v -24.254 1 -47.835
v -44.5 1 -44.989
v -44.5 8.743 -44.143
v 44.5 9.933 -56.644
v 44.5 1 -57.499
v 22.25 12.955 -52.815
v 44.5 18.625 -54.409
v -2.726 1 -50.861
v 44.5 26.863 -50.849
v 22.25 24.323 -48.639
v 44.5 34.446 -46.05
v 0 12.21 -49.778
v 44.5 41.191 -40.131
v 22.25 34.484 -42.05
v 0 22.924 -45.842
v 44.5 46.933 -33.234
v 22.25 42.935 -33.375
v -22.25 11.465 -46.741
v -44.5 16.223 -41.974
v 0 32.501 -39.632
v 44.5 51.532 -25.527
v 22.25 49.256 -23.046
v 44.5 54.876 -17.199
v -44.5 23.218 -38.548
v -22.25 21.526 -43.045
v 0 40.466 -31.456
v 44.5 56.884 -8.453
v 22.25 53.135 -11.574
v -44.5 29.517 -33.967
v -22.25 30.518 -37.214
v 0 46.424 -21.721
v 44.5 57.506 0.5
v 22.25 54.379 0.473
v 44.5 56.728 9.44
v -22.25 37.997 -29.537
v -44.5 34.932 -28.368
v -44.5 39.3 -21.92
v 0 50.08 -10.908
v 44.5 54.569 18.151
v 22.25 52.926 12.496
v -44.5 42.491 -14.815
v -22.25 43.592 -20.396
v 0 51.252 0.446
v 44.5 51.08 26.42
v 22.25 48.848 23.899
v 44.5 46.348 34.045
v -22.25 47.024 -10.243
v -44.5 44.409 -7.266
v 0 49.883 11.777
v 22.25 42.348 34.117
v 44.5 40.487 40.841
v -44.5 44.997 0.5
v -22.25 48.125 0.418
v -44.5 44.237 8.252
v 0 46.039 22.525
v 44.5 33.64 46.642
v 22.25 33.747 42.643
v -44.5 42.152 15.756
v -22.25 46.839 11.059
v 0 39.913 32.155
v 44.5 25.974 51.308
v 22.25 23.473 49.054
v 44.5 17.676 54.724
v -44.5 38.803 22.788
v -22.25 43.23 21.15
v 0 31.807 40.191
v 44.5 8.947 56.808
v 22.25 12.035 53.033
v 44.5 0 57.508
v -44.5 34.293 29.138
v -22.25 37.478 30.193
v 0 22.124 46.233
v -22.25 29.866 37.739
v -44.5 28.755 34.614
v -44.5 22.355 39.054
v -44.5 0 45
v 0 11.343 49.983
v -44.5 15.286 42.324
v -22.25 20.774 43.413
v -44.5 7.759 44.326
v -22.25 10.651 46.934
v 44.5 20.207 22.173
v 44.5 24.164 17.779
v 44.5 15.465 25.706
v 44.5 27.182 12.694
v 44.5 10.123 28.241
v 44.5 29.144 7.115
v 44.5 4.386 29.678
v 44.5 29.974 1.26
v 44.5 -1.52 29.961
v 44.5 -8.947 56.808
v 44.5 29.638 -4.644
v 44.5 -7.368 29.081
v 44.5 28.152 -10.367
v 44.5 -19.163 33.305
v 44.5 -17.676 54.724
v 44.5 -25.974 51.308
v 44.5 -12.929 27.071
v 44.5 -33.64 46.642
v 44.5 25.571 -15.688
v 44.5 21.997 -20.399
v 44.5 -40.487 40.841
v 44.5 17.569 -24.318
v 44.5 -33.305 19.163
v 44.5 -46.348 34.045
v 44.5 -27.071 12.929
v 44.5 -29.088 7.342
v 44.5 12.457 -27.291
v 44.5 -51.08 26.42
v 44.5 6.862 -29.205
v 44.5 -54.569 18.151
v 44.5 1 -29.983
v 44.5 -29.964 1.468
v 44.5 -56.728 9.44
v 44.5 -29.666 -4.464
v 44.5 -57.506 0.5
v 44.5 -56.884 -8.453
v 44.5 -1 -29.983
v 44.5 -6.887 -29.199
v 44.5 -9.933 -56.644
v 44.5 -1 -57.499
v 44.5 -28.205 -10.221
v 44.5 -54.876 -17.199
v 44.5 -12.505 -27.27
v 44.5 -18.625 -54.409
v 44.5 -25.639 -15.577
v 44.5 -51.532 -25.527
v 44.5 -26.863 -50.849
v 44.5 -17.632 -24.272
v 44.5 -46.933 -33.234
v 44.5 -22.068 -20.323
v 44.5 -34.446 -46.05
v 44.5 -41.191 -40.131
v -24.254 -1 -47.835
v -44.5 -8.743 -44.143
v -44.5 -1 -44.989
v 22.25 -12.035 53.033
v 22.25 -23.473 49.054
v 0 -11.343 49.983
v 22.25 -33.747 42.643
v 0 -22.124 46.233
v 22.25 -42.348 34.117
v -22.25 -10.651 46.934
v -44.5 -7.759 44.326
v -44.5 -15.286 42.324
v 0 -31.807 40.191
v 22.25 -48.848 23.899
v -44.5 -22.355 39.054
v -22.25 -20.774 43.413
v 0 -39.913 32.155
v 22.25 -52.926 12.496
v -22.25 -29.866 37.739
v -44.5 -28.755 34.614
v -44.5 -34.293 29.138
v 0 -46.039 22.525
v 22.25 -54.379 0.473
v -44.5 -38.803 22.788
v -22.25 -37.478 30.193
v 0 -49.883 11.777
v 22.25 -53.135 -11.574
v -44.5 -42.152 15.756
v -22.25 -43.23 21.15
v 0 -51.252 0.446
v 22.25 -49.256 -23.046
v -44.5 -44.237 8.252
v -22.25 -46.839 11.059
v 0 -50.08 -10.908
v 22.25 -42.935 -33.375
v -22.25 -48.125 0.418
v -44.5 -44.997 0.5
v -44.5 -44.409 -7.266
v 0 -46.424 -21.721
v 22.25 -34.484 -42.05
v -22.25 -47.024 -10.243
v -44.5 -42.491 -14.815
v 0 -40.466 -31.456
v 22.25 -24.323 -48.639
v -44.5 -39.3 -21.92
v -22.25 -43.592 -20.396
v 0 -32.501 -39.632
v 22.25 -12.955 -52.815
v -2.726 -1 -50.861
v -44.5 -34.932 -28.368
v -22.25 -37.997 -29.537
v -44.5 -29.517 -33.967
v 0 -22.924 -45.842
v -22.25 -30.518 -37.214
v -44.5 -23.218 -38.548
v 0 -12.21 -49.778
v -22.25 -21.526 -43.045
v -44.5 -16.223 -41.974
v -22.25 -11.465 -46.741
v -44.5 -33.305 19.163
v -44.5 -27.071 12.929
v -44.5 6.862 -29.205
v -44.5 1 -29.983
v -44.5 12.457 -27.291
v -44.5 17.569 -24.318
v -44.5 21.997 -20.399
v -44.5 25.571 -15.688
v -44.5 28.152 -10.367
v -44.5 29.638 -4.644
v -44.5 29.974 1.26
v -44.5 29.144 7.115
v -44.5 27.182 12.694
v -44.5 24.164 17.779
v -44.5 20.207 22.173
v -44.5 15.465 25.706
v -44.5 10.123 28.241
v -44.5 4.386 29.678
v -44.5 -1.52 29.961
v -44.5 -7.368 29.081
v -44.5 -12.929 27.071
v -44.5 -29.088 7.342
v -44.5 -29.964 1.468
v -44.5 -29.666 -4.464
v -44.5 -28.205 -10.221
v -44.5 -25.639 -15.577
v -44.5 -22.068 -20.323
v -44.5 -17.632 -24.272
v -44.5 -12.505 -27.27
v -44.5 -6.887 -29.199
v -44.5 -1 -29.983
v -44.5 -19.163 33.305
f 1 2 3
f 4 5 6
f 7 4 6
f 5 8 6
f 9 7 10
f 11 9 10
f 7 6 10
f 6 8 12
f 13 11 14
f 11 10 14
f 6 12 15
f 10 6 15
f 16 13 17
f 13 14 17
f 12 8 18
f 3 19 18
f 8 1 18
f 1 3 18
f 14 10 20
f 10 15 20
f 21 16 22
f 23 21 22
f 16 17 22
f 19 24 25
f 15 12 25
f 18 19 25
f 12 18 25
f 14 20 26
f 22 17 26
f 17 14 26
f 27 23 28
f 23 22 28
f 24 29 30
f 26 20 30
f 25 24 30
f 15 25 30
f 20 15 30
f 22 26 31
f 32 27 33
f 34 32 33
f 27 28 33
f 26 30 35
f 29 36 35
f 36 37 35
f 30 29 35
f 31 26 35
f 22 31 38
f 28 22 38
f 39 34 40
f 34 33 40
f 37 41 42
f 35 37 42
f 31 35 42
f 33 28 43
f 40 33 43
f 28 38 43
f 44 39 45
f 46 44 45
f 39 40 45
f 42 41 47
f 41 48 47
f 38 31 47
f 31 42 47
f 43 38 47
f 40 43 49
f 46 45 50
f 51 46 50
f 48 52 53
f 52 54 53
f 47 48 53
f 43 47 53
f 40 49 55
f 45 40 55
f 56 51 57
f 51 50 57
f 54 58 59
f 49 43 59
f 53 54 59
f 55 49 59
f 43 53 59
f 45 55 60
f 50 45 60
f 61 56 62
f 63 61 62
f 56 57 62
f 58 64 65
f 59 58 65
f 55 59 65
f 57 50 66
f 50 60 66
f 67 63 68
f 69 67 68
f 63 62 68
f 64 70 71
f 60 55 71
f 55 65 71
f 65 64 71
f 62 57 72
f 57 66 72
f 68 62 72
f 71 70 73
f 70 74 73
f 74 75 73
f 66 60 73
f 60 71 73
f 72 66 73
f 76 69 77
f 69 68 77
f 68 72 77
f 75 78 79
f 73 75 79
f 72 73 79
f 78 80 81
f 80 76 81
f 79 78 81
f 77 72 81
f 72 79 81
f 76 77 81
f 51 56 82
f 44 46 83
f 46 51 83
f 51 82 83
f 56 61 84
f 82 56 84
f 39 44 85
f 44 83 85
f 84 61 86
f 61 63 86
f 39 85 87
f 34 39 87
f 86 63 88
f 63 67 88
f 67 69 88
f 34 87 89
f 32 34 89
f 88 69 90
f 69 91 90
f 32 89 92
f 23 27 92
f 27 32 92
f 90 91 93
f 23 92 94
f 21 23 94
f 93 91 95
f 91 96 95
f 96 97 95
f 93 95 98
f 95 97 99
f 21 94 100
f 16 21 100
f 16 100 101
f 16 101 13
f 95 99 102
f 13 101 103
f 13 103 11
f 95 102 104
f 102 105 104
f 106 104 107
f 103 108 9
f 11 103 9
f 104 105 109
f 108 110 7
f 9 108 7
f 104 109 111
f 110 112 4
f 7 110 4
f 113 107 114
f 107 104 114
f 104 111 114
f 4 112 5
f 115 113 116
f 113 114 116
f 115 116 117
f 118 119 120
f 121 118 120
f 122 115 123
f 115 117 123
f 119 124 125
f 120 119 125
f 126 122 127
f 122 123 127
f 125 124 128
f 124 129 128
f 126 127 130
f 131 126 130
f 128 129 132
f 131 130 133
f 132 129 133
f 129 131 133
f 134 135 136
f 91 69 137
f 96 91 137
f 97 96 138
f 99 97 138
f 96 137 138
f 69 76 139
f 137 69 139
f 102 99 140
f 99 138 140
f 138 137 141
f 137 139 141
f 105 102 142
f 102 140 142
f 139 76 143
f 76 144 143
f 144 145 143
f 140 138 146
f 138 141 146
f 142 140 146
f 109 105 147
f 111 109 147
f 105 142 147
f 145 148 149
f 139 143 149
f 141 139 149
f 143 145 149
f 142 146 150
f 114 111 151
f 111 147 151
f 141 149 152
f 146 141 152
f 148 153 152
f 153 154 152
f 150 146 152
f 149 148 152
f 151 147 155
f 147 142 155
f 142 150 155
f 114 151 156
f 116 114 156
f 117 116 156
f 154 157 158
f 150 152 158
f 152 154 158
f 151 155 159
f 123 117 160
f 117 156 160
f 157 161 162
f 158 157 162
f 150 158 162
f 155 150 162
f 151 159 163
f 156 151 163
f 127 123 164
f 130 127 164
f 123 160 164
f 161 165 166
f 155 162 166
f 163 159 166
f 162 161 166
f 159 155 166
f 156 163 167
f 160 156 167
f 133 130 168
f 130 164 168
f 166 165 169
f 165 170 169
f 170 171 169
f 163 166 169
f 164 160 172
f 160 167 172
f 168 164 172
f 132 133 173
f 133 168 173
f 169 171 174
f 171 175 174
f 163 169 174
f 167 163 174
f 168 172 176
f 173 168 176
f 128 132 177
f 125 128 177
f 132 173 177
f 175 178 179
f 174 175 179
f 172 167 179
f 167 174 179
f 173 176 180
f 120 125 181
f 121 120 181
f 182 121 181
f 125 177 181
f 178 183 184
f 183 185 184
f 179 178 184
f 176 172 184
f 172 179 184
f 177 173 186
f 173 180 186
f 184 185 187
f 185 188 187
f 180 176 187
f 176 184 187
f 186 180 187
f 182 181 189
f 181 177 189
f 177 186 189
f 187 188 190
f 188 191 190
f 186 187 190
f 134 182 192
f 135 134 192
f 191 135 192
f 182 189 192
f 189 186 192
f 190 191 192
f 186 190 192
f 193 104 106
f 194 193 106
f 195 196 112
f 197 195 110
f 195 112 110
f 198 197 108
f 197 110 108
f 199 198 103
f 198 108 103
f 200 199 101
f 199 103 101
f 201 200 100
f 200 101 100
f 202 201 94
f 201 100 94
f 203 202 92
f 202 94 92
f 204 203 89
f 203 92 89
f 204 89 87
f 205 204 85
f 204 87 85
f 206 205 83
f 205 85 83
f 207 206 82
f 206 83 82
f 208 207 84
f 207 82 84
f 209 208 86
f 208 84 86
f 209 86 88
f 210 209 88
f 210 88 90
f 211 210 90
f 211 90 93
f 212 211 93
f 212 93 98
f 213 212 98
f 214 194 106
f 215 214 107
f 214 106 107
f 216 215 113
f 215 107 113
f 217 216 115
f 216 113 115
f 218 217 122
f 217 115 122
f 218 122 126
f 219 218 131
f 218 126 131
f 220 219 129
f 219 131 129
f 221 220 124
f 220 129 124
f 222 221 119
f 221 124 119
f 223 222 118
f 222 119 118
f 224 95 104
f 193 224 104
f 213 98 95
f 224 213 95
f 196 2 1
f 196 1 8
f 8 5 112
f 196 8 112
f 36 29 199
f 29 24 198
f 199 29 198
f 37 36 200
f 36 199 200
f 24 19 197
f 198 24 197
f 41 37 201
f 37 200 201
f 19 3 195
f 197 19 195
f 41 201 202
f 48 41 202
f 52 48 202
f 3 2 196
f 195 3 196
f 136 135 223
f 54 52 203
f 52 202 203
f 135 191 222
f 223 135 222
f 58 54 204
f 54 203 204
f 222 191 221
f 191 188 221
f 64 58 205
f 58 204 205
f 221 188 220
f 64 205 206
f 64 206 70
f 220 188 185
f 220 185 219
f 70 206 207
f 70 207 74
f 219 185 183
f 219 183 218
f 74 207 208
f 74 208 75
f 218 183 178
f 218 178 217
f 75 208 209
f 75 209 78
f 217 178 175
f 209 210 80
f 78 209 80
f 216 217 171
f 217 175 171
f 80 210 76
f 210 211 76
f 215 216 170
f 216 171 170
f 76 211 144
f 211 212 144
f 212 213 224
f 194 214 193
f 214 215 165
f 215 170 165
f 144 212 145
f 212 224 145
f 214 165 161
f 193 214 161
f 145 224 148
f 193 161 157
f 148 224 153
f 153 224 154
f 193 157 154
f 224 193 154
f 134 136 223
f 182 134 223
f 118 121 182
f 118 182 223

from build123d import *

# Parameters (mm, degrees)
F2_W     = 2
F2_H     = 35.500896
F3_DEPTH = 89.001
F6_DEPTH = 89.001


with BuildPart() as f1:
    # F0 (on Front) → F1 (revolve)
    with BuildSketch(Plane.XZ):
        Polygon((-44.5, 45), (-44.5, 30), (44.5, 30), (44.5, 57.508134), align=None)
    revolve(axis=Axis((4.300002, 0, 0), (1, 0, 0)))

    # F2 (on face) → F3 (cut, through all)
    with BuildSketch(Plane.YZ.offset(44.5)):
        with Locations((0, -46.971067)):
            Rectangle(F2_W, F2_H)
    extrude(amount=-F3_DEPTH, mode=Mode.SUBTRACT)

    # F5 (on face) → F6 (cut, through all)
    with BuildSketch(Plane.YZ.offset(44.5)):
        Polygon((-9.3801, 23.522235), (-19.162689, 33.304824), (-33.304824, 19.162689), (-23.522235, 9.3801), align=None)
    extrude(amount=-F6_DEPTH, mode=Mode.SUBTRACT)


solid = f1.part
